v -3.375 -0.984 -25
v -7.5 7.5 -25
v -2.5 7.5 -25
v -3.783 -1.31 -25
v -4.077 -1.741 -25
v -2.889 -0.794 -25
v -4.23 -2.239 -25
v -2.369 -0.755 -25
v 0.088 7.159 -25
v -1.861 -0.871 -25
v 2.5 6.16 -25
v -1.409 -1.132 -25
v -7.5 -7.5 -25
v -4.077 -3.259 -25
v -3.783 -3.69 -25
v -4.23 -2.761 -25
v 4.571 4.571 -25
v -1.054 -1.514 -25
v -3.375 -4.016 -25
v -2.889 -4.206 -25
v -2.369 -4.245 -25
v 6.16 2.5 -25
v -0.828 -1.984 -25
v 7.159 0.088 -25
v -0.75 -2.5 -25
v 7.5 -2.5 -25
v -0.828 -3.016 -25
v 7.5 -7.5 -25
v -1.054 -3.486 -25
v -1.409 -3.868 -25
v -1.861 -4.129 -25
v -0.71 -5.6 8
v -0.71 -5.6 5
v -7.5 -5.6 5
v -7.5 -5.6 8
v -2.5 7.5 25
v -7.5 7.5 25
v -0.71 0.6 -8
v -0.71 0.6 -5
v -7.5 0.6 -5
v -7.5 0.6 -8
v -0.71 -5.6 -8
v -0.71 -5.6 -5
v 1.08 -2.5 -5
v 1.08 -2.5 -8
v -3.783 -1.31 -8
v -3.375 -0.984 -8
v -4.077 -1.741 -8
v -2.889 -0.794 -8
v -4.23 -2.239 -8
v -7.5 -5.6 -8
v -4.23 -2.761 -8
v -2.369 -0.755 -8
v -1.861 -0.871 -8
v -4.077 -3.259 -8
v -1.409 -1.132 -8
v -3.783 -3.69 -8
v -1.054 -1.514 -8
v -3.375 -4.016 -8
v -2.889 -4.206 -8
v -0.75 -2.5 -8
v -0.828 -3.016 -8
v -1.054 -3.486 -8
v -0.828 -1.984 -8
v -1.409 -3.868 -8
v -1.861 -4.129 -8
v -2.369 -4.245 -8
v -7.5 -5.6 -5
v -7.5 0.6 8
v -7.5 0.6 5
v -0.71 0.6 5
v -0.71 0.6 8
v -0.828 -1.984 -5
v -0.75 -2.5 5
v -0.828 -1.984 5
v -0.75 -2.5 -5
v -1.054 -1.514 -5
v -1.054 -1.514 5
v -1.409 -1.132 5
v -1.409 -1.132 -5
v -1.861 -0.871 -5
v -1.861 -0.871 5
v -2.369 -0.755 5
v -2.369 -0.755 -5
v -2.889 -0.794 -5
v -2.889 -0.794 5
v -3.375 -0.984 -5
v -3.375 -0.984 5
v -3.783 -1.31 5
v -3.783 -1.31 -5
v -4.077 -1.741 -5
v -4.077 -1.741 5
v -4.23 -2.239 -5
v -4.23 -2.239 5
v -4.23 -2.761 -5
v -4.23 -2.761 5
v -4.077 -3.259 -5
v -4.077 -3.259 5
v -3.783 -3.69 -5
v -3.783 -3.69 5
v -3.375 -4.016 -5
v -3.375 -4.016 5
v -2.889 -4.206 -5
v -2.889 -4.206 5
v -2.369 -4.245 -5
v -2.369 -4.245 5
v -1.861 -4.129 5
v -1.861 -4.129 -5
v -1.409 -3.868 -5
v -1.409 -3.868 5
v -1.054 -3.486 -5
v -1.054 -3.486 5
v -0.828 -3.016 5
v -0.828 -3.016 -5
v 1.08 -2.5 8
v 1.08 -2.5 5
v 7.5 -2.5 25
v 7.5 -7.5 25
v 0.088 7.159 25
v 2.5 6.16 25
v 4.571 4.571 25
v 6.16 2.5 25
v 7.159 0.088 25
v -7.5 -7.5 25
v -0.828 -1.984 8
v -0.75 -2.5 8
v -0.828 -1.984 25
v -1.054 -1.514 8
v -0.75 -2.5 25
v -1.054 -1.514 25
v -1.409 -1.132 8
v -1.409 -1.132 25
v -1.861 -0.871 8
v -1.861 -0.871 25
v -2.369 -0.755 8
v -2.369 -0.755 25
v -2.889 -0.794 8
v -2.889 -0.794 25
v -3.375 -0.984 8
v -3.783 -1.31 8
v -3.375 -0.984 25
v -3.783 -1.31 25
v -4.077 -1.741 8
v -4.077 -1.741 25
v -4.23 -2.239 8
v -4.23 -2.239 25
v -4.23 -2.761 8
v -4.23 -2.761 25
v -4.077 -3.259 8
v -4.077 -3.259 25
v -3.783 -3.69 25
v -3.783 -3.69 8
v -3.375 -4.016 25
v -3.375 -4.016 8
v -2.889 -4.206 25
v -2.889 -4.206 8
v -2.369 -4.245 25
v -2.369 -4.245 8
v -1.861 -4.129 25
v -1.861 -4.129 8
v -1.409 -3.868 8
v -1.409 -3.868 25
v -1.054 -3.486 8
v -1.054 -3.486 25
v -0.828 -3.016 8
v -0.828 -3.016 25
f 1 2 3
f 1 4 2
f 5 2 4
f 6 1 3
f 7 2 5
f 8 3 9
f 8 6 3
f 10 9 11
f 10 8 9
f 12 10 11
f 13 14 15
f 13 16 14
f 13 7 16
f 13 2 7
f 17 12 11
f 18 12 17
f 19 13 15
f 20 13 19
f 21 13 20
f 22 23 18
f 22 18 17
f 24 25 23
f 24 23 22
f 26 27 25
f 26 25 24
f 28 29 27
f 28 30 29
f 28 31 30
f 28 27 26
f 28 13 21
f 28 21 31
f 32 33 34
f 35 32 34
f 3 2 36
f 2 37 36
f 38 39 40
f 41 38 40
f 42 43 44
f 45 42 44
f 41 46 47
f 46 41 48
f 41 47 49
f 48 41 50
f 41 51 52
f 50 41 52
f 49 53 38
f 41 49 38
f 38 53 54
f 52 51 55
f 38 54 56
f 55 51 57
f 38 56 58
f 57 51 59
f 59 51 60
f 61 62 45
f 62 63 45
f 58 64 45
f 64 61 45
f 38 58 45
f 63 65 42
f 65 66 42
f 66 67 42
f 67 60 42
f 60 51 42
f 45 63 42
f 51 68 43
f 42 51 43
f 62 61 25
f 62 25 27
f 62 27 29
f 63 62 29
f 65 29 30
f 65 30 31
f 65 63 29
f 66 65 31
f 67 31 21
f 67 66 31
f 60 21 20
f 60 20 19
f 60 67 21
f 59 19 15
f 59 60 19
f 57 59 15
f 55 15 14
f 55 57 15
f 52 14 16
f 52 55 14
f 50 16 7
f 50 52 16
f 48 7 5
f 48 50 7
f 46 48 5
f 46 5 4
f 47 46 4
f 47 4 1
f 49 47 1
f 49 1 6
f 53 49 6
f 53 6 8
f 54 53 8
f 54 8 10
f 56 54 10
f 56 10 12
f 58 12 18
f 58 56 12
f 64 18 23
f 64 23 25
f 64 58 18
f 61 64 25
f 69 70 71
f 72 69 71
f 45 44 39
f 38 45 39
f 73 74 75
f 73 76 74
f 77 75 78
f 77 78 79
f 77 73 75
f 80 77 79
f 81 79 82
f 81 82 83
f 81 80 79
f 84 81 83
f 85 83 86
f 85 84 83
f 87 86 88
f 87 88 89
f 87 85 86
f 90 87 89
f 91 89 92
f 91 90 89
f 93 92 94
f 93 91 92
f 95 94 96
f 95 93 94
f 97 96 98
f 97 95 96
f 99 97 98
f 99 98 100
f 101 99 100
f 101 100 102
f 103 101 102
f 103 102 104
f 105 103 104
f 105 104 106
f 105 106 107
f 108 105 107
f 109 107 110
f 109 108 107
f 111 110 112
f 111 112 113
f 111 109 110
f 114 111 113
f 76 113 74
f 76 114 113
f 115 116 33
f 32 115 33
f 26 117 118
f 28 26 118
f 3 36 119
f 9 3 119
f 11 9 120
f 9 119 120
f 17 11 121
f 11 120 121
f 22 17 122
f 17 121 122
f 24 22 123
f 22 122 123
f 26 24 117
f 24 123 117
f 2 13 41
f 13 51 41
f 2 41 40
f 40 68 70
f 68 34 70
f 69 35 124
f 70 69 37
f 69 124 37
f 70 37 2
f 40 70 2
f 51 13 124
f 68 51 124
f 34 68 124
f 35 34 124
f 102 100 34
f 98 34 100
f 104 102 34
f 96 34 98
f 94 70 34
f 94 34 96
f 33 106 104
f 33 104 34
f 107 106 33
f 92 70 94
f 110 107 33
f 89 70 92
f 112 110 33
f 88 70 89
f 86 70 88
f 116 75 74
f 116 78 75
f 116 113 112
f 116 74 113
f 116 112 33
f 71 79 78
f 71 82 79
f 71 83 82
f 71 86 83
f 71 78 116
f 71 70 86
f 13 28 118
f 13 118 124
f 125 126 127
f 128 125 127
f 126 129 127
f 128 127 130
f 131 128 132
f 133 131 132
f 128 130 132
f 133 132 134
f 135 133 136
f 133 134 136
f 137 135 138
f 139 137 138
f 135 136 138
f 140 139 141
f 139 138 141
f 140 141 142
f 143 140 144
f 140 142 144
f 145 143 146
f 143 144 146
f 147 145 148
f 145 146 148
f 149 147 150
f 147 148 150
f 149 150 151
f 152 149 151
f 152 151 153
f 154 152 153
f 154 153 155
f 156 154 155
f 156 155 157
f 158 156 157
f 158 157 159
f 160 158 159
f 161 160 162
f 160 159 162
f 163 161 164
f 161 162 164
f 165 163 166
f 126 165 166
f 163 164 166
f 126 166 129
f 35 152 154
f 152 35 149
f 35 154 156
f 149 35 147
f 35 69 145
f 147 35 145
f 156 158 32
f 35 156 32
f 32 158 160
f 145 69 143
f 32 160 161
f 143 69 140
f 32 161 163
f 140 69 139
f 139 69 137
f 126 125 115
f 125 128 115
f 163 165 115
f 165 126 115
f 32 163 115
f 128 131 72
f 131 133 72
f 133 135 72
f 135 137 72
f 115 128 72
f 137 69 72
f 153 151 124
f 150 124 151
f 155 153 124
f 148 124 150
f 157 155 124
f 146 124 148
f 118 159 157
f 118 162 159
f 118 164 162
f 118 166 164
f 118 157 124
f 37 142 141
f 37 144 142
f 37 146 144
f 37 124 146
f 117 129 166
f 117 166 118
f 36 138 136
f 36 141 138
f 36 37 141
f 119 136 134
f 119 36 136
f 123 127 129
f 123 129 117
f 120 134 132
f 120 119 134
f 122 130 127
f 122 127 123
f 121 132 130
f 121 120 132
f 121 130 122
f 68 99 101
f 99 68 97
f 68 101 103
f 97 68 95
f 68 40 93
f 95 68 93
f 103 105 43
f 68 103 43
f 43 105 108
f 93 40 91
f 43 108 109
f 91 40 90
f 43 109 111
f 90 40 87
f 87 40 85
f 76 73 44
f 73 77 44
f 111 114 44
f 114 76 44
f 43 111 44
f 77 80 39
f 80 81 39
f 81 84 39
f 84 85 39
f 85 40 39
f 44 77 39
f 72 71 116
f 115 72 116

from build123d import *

# Parameters (mm, degrees)
F0_R      = 1.75
F1_DEPTH  = 5
F3_DEPTH  = 3
F5_DEPTH  = 3
F7_DEPTH  = 17
F8_R      = 1.75
F9_DEPTH  = 17
F10_R     = 1.75
F11_DEPTH = 50


with BuildPart() as f1:
    # F0 (on Top) → F1 (new body, symmetric)
    with BuildSketch(Plane.XY):
        with BuildLine():
            ThreePointArc((7.5, -2.5), (4.571068, 4.571068), (-2.5, 7.5))
            Line((-2.5, 7.5), (-7.5, 7.5))
            Line((-7.5, 7.5), (-7.5, -7.5))
            Line((-7.5, -7.5), (7.5, -7.5))
            Line((7.5, -7.5), (7.5, -2.5))
        make_face()
        with Locations((-2.5, -2.5)):
            Circle(F0_R, mode=Mode.SUBTRACT)
    extrude(amount=F1_DEPTH, both=True)

    # F2 (on face) → F3 (join)
    with BuildSketch(Plane.XY.offset(5)):
        with BuildLine():
            Line((-7.5, 0.6), (-4.289786, 0.6))
            Line((-4.289786, 0.6), (-0.710214, 0.6))
            Line((-0.710214, 0.6), (1.079572, -2.5))
            Line((1.079572, -2.5), (-0.710214, -5.6))
            Line((-0.710214, -5.6), (-4.289786, -5.6))
            Line((-4.289786, -5.6), (-7.5, -5.6))
            Line((-7.5, -5.6), (-7.5, -7.5))
            Line((-7.5, -7.5), (7.5, -7.5))
            Line((7.5, -7.5), (7.5, -2.5))
            ThreePointArc((7.5, -2.5), (4.571068, 4.571068), (-2.5, 7.5))
            Line((-2.5, 7.5), (-7.5, 7.5))
            Line((-7.5, 7.5), (-7.5, 0.6))
        make_face()
    extrude(amount=F3_DEPTH)

    # F4 (on face) → F5 (join)
    with BuildSketch(Plane(origin=(0, 0, -5), x_dir=(1, 0, 0), z_dir=(0, 0, -1))):
        with BuildLine():
            Line((1.079572, 2.5), (-0.710214, -0.6))
            Line((-0.710214, -0.6), (-4.289786, -0.6))
            Line((-4.289786, -0.6), (-7.5, -0.6))
            Line((-7.5, -0.6), (-7.5, -7.5))
            Line((-7.5, -7.5), (-2.5, -7.5))
            ThreePointArc((-2.5, -7.5), (4.571068, -4.571068), (7.5, 2.5))
            Line((7.5, 2.5), (7.5, 7.5))
            Line((7.5, 7.5), (-7.5, 7.5))
            Line((-7.5, 7.5), (-7.5, 5.6))
            Line((-7.5, 5.6), (-4.289786, 5.6))
            Line((-4.289786, 5.6), (-0.710214, 5.6))
            Line((-0.710214, 5.6), (1.079572, 2.5))
        make_face()
    extrude(amount=F5_DEPTH)

    # F6 (on face) → F7 (join)
    with BuildSketch(Plane.XY.offset(8)):
        with BuildLine():
            Line((-7.5, 7.5), (-7.5, -7.5))
            Line((-7.5, -7.5), (7.5, -7.5))
            Line((7.5, -7.5), (7.5, -2.5))
            ThreePointArc((7.5, -2.5), (4.571068, 4.571068), (-2.5, 7.5))
            Line((-2.5, 7.5), (-7.5, 7.5))
        make_face()
    extrude(amount=F7_DEPTH)

    # F8 (on face) → F9 (join)
    with BuildSketch(Plane(origin=(0, 0, -8), x_dir=(1, 0, 0), z_dir=(0, 0, -1))):
        with BuildLine():
            Line((7.5, 7.5), (-7.5, 7.5))
            Line((-7.5, 7.5), (-7.5, -7.5))
            Line((-7.5, -7.5), (-2.5, -7.5))
            ThreePointArc((-2.5, -7.5), (4.571068, -4.571068), (7.5, 2.5))
            Line((7.5, 2.5), (7.5, 7.5))
        make_face()
        with Locations((-2.5, 2.5)):
            Circle(F8_R, mode=Mode.SUBTRACT)
    extrude(amount=F9_DEPTH)

    # F10 (on face) → F11 (cut)
    with BuildSketch(Plane.XY.offset(25)):
        with Locations((-2.5, -2.5)):
            Circle(F10_R)
    extrude(amount=-F11_DEPTH, mode=Mode.SUBTRACT)


solid = f1.part
